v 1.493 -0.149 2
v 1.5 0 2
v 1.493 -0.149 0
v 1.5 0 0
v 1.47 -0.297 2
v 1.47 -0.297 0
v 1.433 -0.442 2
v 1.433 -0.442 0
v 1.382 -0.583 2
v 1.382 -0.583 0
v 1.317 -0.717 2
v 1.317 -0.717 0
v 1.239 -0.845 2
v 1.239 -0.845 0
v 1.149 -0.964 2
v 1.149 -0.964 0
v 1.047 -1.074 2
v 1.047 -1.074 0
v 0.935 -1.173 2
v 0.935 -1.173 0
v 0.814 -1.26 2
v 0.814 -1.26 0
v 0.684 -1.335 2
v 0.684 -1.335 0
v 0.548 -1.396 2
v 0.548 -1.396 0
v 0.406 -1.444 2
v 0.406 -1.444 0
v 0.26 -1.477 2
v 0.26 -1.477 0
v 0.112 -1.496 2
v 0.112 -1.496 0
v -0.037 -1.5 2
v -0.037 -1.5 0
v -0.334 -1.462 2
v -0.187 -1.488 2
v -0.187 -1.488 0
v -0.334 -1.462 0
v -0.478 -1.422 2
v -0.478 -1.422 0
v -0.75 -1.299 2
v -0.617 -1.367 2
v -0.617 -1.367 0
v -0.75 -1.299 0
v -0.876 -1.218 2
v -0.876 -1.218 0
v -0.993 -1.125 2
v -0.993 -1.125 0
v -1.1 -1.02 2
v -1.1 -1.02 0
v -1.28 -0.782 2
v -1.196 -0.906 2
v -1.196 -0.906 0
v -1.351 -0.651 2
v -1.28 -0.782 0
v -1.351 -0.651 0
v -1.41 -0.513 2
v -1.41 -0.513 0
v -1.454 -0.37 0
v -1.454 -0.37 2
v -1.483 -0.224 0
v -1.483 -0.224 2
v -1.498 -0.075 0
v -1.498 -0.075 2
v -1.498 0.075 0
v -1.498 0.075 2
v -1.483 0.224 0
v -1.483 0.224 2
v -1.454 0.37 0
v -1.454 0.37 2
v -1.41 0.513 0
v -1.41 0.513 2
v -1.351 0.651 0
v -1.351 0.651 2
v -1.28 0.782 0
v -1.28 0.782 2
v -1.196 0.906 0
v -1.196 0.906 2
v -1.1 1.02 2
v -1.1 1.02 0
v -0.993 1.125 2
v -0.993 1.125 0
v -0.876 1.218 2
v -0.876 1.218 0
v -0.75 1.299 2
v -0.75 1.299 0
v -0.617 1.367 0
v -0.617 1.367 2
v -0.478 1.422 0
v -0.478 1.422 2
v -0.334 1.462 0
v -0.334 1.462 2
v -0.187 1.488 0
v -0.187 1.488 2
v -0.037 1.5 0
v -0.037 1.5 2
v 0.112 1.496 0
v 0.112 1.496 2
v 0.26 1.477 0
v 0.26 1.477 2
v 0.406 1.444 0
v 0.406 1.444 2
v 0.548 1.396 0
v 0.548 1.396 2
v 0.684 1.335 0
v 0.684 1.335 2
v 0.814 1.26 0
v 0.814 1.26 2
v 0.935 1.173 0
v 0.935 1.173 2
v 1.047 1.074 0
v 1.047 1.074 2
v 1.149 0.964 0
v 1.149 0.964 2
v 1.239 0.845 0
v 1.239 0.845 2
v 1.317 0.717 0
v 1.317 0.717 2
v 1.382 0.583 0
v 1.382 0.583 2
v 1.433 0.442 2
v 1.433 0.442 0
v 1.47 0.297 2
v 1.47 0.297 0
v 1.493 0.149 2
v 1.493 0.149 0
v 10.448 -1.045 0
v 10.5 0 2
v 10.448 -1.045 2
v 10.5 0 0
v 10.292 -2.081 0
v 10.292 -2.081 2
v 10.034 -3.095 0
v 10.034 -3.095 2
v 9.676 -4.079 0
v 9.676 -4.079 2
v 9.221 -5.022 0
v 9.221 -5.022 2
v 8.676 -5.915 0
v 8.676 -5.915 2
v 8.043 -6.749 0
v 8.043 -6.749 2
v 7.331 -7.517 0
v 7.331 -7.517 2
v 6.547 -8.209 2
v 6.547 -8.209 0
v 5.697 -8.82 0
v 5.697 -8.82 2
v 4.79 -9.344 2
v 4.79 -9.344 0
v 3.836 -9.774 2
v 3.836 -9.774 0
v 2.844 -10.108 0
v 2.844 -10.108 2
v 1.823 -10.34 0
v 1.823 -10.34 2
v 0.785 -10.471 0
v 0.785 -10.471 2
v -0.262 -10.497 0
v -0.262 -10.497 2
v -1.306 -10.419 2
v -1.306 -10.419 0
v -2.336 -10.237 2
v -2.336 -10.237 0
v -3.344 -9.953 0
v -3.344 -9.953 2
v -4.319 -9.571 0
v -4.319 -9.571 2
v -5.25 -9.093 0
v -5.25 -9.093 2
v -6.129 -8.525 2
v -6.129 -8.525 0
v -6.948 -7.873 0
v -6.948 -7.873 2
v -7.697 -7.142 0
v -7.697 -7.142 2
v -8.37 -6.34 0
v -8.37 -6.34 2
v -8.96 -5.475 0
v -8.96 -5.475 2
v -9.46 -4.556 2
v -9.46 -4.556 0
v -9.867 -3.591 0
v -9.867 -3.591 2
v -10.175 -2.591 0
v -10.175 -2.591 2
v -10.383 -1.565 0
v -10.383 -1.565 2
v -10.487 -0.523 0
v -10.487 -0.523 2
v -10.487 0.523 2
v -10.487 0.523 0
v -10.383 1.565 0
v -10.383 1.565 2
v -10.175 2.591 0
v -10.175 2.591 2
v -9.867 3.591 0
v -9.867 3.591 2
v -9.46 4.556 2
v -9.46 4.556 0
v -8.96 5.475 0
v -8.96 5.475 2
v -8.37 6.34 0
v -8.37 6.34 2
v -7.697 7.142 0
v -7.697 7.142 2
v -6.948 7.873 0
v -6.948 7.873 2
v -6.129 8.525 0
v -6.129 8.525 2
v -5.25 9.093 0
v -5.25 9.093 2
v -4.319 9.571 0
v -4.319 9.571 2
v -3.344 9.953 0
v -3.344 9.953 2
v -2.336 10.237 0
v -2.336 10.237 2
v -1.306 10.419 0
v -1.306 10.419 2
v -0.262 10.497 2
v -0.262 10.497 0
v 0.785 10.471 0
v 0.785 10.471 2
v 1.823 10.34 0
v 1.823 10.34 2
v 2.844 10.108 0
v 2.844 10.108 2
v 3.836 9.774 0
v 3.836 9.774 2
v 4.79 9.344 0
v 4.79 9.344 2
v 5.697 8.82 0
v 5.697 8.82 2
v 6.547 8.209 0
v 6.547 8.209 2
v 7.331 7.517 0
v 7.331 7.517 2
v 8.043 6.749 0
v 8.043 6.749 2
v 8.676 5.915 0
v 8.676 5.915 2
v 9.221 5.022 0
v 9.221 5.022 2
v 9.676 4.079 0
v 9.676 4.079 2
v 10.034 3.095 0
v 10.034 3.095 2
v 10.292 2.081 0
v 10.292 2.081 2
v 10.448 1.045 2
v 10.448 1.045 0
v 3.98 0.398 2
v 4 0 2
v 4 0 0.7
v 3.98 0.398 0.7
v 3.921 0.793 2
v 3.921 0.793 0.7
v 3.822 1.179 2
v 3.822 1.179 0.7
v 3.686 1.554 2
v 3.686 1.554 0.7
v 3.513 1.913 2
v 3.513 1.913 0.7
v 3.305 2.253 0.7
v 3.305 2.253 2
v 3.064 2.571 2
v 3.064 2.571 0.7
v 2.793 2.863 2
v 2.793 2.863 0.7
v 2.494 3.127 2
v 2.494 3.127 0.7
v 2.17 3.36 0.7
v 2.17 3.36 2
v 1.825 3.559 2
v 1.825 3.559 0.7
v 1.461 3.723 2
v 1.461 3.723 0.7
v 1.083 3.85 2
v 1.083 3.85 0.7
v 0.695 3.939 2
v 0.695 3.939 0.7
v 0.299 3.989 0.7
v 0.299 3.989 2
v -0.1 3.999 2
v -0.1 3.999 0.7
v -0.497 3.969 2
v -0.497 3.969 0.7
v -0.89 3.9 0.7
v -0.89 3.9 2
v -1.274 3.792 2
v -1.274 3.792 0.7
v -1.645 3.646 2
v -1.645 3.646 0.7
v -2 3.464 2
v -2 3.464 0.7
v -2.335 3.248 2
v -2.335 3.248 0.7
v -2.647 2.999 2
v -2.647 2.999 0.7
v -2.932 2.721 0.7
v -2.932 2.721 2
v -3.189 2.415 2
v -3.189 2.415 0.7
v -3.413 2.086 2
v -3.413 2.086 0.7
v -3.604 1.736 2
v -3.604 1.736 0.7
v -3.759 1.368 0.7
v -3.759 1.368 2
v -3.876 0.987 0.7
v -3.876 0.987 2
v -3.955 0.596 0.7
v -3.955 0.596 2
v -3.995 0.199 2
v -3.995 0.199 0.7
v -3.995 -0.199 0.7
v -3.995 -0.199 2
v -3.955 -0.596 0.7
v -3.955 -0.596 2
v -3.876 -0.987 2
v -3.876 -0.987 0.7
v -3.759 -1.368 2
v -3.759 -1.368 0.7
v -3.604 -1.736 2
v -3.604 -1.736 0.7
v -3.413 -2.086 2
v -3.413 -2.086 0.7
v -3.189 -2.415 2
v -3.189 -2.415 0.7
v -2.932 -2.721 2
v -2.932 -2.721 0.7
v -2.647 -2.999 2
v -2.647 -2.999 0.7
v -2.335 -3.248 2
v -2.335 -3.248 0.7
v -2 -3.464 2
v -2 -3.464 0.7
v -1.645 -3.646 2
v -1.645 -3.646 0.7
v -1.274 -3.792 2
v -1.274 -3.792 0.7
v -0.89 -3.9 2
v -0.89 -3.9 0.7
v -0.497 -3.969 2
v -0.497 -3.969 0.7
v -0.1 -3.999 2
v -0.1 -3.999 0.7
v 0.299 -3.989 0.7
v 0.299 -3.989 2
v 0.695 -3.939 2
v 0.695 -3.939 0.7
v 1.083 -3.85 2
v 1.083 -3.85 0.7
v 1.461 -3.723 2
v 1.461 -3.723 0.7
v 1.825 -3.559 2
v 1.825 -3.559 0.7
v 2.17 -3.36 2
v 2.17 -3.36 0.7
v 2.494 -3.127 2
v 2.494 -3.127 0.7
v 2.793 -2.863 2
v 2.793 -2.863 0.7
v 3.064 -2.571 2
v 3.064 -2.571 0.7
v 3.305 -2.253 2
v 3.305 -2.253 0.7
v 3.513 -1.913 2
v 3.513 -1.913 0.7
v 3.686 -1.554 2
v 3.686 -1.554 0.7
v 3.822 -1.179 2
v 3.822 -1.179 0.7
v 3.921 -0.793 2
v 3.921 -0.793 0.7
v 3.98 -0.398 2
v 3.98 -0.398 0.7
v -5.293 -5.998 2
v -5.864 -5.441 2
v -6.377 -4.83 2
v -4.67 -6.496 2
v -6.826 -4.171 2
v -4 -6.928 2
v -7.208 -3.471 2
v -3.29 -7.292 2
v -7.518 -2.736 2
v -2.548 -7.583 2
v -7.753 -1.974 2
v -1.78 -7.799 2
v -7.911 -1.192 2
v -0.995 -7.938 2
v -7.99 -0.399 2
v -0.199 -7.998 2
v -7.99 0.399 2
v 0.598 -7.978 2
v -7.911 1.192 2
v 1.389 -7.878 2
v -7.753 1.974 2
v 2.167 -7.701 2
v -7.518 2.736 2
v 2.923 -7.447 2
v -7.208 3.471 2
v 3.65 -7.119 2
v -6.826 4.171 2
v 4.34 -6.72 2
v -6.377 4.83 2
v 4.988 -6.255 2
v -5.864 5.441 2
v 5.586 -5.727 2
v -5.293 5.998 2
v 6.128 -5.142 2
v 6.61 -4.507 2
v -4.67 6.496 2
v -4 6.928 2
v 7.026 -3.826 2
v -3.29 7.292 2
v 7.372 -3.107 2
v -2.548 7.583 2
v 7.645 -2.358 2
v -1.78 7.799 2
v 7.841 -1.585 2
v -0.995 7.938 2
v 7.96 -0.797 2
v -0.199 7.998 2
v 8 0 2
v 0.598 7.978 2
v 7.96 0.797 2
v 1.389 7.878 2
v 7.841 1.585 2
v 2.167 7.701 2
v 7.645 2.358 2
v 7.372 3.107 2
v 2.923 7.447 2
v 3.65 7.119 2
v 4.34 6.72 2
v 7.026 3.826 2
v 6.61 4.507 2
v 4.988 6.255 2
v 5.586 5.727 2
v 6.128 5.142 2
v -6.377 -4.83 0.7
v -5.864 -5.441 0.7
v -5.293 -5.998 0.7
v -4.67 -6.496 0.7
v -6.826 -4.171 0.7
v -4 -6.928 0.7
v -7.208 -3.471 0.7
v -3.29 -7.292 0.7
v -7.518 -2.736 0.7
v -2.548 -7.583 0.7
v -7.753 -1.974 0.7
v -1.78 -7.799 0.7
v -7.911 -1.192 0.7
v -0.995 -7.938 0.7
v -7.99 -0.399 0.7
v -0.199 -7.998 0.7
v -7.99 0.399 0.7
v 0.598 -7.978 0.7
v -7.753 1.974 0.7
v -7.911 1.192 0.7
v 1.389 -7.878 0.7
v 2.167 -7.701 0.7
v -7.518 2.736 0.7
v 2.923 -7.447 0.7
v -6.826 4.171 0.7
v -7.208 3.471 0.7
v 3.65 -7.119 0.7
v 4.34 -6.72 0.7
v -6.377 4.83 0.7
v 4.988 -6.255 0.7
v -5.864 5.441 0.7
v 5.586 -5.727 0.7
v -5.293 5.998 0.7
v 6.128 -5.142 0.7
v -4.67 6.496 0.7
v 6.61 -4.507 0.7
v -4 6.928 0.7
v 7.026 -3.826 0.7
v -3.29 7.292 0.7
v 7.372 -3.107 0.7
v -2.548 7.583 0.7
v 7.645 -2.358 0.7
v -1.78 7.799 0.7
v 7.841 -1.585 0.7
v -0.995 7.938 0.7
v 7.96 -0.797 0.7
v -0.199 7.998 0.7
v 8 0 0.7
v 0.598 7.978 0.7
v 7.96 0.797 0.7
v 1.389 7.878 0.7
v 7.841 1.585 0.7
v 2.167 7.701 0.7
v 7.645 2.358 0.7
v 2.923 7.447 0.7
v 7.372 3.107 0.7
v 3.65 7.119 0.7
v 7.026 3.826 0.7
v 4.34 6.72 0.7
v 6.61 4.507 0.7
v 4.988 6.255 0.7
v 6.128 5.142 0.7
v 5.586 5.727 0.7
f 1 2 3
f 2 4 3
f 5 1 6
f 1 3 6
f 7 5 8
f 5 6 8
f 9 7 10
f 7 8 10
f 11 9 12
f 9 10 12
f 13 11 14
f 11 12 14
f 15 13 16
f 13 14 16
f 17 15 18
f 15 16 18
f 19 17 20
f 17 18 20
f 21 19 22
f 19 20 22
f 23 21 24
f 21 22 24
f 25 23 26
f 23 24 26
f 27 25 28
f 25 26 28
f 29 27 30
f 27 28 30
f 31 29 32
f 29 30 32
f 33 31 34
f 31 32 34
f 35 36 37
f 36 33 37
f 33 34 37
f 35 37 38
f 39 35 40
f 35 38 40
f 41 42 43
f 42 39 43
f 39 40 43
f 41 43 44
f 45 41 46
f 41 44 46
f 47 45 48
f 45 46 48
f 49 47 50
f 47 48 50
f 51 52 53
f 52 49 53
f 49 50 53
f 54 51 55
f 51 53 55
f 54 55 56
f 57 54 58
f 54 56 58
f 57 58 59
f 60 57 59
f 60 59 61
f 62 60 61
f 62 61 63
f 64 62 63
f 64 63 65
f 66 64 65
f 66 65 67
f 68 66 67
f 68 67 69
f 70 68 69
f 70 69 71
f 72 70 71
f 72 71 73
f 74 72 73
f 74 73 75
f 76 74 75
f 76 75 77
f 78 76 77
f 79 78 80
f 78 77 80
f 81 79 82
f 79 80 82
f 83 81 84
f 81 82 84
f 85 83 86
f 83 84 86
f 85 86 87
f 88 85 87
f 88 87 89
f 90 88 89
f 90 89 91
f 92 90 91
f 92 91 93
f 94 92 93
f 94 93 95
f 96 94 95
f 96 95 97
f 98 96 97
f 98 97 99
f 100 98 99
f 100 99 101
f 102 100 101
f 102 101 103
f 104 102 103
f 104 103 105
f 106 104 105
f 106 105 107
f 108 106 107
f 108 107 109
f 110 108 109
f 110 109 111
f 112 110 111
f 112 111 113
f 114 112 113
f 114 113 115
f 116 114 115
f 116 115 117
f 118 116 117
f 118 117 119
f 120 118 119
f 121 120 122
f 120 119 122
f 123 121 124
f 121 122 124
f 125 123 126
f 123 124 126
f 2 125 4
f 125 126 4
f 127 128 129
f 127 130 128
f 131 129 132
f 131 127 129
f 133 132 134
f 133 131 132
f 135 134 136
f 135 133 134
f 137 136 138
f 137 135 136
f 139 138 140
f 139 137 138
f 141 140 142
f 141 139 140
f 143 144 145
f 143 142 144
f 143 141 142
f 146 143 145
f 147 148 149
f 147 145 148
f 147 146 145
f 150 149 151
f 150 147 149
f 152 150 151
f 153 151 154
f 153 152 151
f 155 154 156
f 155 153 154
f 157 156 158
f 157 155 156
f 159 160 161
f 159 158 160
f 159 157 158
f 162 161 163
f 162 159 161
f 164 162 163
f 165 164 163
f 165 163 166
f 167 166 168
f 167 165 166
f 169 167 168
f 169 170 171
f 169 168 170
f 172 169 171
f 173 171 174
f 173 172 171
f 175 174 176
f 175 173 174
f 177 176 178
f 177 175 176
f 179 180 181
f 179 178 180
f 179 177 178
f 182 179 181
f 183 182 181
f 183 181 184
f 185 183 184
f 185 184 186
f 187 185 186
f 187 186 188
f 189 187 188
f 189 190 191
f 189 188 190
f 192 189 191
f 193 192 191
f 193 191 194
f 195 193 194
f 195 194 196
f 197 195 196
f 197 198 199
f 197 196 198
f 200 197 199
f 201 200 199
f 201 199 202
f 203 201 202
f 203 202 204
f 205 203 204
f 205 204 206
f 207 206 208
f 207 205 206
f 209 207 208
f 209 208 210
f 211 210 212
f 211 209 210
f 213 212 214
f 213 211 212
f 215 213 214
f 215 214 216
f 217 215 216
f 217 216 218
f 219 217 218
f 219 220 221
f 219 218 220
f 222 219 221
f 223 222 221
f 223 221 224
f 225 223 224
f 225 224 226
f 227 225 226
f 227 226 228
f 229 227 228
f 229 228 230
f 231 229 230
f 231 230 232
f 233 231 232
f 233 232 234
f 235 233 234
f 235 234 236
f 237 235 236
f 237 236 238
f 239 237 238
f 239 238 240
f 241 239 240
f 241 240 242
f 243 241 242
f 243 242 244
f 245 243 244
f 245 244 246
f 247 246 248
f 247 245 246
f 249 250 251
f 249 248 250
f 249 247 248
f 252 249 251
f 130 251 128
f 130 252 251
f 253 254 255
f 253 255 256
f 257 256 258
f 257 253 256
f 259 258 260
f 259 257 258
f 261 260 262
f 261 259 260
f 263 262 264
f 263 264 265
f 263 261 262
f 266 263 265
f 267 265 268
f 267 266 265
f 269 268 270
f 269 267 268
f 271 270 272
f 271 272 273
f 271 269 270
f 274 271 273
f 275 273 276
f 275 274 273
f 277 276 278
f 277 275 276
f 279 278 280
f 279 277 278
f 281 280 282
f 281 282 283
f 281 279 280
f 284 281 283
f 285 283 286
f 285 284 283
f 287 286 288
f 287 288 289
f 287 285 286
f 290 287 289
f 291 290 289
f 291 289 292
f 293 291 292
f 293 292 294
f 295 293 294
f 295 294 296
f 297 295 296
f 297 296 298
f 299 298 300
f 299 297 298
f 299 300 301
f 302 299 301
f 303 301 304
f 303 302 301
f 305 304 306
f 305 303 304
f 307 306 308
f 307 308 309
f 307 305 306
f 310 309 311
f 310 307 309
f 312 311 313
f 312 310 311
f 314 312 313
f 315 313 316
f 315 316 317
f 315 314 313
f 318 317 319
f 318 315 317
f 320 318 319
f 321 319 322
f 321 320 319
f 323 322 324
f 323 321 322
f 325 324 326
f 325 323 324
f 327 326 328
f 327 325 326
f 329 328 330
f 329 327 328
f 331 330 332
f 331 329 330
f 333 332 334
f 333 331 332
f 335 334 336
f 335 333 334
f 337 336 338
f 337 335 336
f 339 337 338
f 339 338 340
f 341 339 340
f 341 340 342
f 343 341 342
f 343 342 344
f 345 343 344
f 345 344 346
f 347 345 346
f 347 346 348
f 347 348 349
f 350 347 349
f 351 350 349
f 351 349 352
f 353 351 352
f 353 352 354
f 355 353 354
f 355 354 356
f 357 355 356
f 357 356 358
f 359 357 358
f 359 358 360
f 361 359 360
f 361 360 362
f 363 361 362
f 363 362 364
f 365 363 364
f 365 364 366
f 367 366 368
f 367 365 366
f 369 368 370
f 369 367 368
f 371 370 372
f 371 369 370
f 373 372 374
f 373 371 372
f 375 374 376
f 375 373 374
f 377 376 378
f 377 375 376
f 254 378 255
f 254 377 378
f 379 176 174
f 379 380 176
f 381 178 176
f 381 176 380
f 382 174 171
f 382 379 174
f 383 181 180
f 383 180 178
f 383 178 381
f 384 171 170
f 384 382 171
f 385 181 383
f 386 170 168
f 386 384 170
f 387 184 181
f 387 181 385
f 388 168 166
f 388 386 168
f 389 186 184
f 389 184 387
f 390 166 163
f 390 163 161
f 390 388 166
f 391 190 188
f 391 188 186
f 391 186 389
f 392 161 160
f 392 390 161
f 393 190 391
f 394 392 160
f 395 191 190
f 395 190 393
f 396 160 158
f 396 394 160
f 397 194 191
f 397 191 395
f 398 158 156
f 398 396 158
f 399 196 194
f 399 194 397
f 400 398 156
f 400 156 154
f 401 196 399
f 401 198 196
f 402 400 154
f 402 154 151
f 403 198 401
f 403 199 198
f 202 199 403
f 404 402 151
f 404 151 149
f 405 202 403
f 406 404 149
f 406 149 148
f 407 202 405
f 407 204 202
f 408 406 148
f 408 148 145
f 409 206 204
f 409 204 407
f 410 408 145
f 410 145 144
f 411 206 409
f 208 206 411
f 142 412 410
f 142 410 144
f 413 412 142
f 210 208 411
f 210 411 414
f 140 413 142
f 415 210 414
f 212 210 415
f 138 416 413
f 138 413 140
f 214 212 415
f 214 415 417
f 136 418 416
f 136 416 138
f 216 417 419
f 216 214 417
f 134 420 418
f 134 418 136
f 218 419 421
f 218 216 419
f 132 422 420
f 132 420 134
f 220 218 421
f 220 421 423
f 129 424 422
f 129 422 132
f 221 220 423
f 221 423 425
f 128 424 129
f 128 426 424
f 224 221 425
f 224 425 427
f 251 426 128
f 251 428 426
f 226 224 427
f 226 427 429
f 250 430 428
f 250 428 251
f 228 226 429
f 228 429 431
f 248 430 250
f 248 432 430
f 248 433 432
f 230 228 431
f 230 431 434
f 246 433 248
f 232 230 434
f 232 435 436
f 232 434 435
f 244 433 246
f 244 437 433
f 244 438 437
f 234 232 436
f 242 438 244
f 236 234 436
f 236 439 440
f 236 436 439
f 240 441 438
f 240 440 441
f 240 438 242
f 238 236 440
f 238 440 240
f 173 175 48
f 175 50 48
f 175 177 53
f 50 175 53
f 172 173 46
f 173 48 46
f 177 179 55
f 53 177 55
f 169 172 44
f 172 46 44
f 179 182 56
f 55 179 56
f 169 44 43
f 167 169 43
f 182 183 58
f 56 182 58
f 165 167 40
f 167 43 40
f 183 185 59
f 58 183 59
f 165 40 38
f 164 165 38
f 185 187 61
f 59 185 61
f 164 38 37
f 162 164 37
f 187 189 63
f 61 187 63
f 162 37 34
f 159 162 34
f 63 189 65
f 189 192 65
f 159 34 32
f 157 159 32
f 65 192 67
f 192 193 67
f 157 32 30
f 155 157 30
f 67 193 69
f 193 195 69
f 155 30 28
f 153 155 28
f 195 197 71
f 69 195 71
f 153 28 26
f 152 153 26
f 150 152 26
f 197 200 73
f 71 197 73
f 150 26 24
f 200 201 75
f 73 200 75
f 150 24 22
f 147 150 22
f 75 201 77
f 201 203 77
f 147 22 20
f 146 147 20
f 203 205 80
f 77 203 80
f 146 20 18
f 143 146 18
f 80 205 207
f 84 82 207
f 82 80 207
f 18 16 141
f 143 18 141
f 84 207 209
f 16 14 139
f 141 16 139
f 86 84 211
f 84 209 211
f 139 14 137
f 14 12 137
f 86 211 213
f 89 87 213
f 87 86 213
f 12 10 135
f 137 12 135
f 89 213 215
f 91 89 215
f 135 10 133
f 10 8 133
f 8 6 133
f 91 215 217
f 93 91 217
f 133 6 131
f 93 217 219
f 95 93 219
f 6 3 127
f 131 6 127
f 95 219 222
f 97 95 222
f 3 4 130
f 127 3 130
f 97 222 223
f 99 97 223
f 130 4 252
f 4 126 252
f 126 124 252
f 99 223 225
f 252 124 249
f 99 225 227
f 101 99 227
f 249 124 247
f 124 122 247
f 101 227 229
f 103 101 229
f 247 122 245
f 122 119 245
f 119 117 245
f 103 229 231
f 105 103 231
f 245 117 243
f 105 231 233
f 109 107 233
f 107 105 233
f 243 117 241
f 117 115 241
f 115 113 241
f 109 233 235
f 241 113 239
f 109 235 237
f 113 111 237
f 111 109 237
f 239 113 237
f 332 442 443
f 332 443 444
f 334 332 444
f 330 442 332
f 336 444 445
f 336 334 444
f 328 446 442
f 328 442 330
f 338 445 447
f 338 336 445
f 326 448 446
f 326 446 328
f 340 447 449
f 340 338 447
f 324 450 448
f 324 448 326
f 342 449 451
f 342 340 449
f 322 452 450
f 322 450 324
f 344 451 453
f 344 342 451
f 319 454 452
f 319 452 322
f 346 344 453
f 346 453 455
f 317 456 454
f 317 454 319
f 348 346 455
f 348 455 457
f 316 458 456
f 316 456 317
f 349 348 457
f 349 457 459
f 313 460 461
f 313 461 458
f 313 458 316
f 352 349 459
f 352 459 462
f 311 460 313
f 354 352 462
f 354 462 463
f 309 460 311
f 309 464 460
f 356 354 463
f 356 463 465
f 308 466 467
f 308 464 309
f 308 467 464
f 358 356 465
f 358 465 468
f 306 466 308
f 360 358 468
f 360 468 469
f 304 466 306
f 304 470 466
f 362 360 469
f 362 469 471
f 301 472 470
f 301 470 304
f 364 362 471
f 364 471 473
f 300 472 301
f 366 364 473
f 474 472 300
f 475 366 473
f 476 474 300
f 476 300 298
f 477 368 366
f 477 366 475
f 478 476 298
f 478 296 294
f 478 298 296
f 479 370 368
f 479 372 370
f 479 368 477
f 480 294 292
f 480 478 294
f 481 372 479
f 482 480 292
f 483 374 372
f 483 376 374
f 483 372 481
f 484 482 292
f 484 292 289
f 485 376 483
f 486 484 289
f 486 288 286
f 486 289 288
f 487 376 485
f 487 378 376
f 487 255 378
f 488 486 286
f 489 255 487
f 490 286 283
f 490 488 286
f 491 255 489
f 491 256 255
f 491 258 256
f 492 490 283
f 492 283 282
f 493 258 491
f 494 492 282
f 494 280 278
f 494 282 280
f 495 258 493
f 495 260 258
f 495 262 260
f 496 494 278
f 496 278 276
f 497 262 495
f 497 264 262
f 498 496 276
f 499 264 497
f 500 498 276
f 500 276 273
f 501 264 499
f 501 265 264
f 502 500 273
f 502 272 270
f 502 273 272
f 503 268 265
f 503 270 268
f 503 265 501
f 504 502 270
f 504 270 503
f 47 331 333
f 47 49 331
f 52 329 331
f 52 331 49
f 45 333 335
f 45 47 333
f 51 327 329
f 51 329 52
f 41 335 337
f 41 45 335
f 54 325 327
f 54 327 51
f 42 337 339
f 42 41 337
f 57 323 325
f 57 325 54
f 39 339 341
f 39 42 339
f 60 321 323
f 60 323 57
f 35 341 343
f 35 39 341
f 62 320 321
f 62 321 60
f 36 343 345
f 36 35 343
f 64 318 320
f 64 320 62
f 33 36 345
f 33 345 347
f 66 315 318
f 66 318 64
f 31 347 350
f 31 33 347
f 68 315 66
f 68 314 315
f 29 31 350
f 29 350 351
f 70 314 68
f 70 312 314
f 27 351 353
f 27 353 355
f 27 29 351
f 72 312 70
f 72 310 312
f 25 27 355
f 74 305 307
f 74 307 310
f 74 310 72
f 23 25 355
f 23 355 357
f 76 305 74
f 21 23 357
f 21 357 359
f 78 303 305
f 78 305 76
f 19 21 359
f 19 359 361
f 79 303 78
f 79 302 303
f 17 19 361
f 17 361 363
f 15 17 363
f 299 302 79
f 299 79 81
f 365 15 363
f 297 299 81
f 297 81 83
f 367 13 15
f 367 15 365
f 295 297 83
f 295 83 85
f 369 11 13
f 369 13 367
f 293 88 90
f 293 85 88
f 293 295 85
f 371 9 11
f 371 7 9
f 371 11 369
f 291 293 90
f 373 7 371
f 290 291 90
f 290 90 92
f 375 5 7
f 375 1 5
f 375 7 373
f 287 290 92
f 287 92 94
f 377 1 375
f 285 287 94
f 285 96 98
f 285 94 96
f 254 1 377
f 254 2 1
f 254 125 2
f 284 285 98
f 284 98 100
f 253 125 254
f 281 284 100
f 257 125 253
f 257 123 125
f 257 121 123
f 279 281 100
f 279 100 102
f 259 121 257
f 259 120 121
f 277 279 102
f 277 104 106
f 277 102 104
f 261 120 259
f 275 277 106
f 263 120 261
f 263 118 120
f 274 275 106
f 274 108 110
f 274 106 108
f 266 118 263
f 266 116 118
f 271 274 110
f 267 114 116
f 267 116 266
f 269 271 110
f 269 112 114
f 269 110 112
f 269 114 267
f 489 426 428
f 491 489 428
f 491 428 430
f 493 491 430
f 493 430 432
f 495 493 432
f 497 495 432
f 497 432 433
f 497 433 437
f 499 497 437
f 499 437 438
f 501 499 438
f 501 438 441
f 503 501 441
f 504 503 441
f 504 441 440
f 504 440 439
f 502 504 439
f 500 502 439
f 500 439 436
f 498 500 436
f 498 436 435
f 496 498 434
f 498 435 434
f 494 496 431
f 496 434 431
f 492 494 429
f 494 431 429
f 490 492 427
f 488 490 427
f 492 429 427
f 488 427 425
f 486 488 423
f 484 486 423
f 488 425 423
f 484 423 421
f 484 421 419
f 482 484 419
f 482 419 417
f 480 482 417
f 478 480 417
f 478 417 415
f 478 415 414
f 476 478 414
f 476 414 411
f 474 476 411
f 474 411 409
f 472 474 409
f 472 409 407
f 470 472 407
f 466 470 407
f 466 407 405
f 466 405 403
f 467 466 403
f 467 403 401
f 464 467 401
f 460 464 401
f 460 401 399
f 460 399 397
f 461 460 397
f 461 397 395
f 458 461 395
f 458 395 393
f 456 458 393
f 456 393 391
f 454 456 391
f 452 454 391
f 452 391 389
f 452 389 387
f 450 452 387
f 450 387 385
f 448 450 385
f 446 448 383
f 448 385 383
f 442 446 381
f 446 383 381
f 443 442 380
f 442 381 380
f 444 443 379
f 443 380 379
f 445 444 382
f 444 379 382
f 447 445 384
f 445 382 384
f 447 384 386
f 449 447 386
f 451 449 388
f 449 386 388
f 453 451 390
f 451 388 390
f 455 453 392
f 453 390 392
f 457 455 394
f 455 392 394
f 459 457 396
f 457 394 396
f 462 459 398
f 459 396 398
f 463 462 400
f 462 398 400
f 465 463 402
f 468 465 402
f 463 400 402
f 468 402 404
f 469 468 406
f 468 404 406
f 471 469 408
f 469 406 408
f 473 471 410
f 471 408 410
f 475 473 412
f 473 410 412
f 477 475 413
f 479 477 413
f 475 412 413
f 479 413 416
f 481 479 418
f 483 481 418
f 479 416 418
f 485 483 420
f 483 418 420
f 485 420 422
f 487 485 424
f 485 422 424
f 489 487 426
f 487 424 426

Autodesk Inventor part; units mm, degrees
ref_plane "YZ Plane" through (0, 0, 0) normal (1, 0, 0) x (0, 1, 0)
ref_plane "XZ Plane" through (0, 0, 0) normal (0, 1, 0) x (-1, 0, 0)
ref_plane "XY Plane" through (0, 0, 0) normal (0, 0, 1) x (1, 0, 0)
sketch "スケッチ1" plane through (0, 0, 0) normal (0, 0, 1) x (1, 0, 0)
  circle A0 centre (0, 0) radius 1.5
  circle A1 centre (0, 0) radius 10.5
  dimension "d0" = 3
  dimension "d1" = 21
extrude "押し出し1" add sketch "スケッチ1" along normal blind 2
sketch "スケッチ2" plane through (0, 0, 2) normal (0, 0, 1) x (1, 0, 0)
  circle A0 centre (0, 0) radius 10.5 projected
  circle A1 centre (0, 0) radius 1.5 projected
  circle A2 centre (0, 0) radius 8
  circle A3 centre (0, 0) radius 4
  dimension "d4" = 2.5
  dimension "d5" = 2.5
  dimension "d6" = 4
extrude "押し出し2" cut sketch "スケッチ2" against normal blind 1.3 contours A2
properties part number "ウィング引っ掛け" material "ポリカーボネート、スモーク"
